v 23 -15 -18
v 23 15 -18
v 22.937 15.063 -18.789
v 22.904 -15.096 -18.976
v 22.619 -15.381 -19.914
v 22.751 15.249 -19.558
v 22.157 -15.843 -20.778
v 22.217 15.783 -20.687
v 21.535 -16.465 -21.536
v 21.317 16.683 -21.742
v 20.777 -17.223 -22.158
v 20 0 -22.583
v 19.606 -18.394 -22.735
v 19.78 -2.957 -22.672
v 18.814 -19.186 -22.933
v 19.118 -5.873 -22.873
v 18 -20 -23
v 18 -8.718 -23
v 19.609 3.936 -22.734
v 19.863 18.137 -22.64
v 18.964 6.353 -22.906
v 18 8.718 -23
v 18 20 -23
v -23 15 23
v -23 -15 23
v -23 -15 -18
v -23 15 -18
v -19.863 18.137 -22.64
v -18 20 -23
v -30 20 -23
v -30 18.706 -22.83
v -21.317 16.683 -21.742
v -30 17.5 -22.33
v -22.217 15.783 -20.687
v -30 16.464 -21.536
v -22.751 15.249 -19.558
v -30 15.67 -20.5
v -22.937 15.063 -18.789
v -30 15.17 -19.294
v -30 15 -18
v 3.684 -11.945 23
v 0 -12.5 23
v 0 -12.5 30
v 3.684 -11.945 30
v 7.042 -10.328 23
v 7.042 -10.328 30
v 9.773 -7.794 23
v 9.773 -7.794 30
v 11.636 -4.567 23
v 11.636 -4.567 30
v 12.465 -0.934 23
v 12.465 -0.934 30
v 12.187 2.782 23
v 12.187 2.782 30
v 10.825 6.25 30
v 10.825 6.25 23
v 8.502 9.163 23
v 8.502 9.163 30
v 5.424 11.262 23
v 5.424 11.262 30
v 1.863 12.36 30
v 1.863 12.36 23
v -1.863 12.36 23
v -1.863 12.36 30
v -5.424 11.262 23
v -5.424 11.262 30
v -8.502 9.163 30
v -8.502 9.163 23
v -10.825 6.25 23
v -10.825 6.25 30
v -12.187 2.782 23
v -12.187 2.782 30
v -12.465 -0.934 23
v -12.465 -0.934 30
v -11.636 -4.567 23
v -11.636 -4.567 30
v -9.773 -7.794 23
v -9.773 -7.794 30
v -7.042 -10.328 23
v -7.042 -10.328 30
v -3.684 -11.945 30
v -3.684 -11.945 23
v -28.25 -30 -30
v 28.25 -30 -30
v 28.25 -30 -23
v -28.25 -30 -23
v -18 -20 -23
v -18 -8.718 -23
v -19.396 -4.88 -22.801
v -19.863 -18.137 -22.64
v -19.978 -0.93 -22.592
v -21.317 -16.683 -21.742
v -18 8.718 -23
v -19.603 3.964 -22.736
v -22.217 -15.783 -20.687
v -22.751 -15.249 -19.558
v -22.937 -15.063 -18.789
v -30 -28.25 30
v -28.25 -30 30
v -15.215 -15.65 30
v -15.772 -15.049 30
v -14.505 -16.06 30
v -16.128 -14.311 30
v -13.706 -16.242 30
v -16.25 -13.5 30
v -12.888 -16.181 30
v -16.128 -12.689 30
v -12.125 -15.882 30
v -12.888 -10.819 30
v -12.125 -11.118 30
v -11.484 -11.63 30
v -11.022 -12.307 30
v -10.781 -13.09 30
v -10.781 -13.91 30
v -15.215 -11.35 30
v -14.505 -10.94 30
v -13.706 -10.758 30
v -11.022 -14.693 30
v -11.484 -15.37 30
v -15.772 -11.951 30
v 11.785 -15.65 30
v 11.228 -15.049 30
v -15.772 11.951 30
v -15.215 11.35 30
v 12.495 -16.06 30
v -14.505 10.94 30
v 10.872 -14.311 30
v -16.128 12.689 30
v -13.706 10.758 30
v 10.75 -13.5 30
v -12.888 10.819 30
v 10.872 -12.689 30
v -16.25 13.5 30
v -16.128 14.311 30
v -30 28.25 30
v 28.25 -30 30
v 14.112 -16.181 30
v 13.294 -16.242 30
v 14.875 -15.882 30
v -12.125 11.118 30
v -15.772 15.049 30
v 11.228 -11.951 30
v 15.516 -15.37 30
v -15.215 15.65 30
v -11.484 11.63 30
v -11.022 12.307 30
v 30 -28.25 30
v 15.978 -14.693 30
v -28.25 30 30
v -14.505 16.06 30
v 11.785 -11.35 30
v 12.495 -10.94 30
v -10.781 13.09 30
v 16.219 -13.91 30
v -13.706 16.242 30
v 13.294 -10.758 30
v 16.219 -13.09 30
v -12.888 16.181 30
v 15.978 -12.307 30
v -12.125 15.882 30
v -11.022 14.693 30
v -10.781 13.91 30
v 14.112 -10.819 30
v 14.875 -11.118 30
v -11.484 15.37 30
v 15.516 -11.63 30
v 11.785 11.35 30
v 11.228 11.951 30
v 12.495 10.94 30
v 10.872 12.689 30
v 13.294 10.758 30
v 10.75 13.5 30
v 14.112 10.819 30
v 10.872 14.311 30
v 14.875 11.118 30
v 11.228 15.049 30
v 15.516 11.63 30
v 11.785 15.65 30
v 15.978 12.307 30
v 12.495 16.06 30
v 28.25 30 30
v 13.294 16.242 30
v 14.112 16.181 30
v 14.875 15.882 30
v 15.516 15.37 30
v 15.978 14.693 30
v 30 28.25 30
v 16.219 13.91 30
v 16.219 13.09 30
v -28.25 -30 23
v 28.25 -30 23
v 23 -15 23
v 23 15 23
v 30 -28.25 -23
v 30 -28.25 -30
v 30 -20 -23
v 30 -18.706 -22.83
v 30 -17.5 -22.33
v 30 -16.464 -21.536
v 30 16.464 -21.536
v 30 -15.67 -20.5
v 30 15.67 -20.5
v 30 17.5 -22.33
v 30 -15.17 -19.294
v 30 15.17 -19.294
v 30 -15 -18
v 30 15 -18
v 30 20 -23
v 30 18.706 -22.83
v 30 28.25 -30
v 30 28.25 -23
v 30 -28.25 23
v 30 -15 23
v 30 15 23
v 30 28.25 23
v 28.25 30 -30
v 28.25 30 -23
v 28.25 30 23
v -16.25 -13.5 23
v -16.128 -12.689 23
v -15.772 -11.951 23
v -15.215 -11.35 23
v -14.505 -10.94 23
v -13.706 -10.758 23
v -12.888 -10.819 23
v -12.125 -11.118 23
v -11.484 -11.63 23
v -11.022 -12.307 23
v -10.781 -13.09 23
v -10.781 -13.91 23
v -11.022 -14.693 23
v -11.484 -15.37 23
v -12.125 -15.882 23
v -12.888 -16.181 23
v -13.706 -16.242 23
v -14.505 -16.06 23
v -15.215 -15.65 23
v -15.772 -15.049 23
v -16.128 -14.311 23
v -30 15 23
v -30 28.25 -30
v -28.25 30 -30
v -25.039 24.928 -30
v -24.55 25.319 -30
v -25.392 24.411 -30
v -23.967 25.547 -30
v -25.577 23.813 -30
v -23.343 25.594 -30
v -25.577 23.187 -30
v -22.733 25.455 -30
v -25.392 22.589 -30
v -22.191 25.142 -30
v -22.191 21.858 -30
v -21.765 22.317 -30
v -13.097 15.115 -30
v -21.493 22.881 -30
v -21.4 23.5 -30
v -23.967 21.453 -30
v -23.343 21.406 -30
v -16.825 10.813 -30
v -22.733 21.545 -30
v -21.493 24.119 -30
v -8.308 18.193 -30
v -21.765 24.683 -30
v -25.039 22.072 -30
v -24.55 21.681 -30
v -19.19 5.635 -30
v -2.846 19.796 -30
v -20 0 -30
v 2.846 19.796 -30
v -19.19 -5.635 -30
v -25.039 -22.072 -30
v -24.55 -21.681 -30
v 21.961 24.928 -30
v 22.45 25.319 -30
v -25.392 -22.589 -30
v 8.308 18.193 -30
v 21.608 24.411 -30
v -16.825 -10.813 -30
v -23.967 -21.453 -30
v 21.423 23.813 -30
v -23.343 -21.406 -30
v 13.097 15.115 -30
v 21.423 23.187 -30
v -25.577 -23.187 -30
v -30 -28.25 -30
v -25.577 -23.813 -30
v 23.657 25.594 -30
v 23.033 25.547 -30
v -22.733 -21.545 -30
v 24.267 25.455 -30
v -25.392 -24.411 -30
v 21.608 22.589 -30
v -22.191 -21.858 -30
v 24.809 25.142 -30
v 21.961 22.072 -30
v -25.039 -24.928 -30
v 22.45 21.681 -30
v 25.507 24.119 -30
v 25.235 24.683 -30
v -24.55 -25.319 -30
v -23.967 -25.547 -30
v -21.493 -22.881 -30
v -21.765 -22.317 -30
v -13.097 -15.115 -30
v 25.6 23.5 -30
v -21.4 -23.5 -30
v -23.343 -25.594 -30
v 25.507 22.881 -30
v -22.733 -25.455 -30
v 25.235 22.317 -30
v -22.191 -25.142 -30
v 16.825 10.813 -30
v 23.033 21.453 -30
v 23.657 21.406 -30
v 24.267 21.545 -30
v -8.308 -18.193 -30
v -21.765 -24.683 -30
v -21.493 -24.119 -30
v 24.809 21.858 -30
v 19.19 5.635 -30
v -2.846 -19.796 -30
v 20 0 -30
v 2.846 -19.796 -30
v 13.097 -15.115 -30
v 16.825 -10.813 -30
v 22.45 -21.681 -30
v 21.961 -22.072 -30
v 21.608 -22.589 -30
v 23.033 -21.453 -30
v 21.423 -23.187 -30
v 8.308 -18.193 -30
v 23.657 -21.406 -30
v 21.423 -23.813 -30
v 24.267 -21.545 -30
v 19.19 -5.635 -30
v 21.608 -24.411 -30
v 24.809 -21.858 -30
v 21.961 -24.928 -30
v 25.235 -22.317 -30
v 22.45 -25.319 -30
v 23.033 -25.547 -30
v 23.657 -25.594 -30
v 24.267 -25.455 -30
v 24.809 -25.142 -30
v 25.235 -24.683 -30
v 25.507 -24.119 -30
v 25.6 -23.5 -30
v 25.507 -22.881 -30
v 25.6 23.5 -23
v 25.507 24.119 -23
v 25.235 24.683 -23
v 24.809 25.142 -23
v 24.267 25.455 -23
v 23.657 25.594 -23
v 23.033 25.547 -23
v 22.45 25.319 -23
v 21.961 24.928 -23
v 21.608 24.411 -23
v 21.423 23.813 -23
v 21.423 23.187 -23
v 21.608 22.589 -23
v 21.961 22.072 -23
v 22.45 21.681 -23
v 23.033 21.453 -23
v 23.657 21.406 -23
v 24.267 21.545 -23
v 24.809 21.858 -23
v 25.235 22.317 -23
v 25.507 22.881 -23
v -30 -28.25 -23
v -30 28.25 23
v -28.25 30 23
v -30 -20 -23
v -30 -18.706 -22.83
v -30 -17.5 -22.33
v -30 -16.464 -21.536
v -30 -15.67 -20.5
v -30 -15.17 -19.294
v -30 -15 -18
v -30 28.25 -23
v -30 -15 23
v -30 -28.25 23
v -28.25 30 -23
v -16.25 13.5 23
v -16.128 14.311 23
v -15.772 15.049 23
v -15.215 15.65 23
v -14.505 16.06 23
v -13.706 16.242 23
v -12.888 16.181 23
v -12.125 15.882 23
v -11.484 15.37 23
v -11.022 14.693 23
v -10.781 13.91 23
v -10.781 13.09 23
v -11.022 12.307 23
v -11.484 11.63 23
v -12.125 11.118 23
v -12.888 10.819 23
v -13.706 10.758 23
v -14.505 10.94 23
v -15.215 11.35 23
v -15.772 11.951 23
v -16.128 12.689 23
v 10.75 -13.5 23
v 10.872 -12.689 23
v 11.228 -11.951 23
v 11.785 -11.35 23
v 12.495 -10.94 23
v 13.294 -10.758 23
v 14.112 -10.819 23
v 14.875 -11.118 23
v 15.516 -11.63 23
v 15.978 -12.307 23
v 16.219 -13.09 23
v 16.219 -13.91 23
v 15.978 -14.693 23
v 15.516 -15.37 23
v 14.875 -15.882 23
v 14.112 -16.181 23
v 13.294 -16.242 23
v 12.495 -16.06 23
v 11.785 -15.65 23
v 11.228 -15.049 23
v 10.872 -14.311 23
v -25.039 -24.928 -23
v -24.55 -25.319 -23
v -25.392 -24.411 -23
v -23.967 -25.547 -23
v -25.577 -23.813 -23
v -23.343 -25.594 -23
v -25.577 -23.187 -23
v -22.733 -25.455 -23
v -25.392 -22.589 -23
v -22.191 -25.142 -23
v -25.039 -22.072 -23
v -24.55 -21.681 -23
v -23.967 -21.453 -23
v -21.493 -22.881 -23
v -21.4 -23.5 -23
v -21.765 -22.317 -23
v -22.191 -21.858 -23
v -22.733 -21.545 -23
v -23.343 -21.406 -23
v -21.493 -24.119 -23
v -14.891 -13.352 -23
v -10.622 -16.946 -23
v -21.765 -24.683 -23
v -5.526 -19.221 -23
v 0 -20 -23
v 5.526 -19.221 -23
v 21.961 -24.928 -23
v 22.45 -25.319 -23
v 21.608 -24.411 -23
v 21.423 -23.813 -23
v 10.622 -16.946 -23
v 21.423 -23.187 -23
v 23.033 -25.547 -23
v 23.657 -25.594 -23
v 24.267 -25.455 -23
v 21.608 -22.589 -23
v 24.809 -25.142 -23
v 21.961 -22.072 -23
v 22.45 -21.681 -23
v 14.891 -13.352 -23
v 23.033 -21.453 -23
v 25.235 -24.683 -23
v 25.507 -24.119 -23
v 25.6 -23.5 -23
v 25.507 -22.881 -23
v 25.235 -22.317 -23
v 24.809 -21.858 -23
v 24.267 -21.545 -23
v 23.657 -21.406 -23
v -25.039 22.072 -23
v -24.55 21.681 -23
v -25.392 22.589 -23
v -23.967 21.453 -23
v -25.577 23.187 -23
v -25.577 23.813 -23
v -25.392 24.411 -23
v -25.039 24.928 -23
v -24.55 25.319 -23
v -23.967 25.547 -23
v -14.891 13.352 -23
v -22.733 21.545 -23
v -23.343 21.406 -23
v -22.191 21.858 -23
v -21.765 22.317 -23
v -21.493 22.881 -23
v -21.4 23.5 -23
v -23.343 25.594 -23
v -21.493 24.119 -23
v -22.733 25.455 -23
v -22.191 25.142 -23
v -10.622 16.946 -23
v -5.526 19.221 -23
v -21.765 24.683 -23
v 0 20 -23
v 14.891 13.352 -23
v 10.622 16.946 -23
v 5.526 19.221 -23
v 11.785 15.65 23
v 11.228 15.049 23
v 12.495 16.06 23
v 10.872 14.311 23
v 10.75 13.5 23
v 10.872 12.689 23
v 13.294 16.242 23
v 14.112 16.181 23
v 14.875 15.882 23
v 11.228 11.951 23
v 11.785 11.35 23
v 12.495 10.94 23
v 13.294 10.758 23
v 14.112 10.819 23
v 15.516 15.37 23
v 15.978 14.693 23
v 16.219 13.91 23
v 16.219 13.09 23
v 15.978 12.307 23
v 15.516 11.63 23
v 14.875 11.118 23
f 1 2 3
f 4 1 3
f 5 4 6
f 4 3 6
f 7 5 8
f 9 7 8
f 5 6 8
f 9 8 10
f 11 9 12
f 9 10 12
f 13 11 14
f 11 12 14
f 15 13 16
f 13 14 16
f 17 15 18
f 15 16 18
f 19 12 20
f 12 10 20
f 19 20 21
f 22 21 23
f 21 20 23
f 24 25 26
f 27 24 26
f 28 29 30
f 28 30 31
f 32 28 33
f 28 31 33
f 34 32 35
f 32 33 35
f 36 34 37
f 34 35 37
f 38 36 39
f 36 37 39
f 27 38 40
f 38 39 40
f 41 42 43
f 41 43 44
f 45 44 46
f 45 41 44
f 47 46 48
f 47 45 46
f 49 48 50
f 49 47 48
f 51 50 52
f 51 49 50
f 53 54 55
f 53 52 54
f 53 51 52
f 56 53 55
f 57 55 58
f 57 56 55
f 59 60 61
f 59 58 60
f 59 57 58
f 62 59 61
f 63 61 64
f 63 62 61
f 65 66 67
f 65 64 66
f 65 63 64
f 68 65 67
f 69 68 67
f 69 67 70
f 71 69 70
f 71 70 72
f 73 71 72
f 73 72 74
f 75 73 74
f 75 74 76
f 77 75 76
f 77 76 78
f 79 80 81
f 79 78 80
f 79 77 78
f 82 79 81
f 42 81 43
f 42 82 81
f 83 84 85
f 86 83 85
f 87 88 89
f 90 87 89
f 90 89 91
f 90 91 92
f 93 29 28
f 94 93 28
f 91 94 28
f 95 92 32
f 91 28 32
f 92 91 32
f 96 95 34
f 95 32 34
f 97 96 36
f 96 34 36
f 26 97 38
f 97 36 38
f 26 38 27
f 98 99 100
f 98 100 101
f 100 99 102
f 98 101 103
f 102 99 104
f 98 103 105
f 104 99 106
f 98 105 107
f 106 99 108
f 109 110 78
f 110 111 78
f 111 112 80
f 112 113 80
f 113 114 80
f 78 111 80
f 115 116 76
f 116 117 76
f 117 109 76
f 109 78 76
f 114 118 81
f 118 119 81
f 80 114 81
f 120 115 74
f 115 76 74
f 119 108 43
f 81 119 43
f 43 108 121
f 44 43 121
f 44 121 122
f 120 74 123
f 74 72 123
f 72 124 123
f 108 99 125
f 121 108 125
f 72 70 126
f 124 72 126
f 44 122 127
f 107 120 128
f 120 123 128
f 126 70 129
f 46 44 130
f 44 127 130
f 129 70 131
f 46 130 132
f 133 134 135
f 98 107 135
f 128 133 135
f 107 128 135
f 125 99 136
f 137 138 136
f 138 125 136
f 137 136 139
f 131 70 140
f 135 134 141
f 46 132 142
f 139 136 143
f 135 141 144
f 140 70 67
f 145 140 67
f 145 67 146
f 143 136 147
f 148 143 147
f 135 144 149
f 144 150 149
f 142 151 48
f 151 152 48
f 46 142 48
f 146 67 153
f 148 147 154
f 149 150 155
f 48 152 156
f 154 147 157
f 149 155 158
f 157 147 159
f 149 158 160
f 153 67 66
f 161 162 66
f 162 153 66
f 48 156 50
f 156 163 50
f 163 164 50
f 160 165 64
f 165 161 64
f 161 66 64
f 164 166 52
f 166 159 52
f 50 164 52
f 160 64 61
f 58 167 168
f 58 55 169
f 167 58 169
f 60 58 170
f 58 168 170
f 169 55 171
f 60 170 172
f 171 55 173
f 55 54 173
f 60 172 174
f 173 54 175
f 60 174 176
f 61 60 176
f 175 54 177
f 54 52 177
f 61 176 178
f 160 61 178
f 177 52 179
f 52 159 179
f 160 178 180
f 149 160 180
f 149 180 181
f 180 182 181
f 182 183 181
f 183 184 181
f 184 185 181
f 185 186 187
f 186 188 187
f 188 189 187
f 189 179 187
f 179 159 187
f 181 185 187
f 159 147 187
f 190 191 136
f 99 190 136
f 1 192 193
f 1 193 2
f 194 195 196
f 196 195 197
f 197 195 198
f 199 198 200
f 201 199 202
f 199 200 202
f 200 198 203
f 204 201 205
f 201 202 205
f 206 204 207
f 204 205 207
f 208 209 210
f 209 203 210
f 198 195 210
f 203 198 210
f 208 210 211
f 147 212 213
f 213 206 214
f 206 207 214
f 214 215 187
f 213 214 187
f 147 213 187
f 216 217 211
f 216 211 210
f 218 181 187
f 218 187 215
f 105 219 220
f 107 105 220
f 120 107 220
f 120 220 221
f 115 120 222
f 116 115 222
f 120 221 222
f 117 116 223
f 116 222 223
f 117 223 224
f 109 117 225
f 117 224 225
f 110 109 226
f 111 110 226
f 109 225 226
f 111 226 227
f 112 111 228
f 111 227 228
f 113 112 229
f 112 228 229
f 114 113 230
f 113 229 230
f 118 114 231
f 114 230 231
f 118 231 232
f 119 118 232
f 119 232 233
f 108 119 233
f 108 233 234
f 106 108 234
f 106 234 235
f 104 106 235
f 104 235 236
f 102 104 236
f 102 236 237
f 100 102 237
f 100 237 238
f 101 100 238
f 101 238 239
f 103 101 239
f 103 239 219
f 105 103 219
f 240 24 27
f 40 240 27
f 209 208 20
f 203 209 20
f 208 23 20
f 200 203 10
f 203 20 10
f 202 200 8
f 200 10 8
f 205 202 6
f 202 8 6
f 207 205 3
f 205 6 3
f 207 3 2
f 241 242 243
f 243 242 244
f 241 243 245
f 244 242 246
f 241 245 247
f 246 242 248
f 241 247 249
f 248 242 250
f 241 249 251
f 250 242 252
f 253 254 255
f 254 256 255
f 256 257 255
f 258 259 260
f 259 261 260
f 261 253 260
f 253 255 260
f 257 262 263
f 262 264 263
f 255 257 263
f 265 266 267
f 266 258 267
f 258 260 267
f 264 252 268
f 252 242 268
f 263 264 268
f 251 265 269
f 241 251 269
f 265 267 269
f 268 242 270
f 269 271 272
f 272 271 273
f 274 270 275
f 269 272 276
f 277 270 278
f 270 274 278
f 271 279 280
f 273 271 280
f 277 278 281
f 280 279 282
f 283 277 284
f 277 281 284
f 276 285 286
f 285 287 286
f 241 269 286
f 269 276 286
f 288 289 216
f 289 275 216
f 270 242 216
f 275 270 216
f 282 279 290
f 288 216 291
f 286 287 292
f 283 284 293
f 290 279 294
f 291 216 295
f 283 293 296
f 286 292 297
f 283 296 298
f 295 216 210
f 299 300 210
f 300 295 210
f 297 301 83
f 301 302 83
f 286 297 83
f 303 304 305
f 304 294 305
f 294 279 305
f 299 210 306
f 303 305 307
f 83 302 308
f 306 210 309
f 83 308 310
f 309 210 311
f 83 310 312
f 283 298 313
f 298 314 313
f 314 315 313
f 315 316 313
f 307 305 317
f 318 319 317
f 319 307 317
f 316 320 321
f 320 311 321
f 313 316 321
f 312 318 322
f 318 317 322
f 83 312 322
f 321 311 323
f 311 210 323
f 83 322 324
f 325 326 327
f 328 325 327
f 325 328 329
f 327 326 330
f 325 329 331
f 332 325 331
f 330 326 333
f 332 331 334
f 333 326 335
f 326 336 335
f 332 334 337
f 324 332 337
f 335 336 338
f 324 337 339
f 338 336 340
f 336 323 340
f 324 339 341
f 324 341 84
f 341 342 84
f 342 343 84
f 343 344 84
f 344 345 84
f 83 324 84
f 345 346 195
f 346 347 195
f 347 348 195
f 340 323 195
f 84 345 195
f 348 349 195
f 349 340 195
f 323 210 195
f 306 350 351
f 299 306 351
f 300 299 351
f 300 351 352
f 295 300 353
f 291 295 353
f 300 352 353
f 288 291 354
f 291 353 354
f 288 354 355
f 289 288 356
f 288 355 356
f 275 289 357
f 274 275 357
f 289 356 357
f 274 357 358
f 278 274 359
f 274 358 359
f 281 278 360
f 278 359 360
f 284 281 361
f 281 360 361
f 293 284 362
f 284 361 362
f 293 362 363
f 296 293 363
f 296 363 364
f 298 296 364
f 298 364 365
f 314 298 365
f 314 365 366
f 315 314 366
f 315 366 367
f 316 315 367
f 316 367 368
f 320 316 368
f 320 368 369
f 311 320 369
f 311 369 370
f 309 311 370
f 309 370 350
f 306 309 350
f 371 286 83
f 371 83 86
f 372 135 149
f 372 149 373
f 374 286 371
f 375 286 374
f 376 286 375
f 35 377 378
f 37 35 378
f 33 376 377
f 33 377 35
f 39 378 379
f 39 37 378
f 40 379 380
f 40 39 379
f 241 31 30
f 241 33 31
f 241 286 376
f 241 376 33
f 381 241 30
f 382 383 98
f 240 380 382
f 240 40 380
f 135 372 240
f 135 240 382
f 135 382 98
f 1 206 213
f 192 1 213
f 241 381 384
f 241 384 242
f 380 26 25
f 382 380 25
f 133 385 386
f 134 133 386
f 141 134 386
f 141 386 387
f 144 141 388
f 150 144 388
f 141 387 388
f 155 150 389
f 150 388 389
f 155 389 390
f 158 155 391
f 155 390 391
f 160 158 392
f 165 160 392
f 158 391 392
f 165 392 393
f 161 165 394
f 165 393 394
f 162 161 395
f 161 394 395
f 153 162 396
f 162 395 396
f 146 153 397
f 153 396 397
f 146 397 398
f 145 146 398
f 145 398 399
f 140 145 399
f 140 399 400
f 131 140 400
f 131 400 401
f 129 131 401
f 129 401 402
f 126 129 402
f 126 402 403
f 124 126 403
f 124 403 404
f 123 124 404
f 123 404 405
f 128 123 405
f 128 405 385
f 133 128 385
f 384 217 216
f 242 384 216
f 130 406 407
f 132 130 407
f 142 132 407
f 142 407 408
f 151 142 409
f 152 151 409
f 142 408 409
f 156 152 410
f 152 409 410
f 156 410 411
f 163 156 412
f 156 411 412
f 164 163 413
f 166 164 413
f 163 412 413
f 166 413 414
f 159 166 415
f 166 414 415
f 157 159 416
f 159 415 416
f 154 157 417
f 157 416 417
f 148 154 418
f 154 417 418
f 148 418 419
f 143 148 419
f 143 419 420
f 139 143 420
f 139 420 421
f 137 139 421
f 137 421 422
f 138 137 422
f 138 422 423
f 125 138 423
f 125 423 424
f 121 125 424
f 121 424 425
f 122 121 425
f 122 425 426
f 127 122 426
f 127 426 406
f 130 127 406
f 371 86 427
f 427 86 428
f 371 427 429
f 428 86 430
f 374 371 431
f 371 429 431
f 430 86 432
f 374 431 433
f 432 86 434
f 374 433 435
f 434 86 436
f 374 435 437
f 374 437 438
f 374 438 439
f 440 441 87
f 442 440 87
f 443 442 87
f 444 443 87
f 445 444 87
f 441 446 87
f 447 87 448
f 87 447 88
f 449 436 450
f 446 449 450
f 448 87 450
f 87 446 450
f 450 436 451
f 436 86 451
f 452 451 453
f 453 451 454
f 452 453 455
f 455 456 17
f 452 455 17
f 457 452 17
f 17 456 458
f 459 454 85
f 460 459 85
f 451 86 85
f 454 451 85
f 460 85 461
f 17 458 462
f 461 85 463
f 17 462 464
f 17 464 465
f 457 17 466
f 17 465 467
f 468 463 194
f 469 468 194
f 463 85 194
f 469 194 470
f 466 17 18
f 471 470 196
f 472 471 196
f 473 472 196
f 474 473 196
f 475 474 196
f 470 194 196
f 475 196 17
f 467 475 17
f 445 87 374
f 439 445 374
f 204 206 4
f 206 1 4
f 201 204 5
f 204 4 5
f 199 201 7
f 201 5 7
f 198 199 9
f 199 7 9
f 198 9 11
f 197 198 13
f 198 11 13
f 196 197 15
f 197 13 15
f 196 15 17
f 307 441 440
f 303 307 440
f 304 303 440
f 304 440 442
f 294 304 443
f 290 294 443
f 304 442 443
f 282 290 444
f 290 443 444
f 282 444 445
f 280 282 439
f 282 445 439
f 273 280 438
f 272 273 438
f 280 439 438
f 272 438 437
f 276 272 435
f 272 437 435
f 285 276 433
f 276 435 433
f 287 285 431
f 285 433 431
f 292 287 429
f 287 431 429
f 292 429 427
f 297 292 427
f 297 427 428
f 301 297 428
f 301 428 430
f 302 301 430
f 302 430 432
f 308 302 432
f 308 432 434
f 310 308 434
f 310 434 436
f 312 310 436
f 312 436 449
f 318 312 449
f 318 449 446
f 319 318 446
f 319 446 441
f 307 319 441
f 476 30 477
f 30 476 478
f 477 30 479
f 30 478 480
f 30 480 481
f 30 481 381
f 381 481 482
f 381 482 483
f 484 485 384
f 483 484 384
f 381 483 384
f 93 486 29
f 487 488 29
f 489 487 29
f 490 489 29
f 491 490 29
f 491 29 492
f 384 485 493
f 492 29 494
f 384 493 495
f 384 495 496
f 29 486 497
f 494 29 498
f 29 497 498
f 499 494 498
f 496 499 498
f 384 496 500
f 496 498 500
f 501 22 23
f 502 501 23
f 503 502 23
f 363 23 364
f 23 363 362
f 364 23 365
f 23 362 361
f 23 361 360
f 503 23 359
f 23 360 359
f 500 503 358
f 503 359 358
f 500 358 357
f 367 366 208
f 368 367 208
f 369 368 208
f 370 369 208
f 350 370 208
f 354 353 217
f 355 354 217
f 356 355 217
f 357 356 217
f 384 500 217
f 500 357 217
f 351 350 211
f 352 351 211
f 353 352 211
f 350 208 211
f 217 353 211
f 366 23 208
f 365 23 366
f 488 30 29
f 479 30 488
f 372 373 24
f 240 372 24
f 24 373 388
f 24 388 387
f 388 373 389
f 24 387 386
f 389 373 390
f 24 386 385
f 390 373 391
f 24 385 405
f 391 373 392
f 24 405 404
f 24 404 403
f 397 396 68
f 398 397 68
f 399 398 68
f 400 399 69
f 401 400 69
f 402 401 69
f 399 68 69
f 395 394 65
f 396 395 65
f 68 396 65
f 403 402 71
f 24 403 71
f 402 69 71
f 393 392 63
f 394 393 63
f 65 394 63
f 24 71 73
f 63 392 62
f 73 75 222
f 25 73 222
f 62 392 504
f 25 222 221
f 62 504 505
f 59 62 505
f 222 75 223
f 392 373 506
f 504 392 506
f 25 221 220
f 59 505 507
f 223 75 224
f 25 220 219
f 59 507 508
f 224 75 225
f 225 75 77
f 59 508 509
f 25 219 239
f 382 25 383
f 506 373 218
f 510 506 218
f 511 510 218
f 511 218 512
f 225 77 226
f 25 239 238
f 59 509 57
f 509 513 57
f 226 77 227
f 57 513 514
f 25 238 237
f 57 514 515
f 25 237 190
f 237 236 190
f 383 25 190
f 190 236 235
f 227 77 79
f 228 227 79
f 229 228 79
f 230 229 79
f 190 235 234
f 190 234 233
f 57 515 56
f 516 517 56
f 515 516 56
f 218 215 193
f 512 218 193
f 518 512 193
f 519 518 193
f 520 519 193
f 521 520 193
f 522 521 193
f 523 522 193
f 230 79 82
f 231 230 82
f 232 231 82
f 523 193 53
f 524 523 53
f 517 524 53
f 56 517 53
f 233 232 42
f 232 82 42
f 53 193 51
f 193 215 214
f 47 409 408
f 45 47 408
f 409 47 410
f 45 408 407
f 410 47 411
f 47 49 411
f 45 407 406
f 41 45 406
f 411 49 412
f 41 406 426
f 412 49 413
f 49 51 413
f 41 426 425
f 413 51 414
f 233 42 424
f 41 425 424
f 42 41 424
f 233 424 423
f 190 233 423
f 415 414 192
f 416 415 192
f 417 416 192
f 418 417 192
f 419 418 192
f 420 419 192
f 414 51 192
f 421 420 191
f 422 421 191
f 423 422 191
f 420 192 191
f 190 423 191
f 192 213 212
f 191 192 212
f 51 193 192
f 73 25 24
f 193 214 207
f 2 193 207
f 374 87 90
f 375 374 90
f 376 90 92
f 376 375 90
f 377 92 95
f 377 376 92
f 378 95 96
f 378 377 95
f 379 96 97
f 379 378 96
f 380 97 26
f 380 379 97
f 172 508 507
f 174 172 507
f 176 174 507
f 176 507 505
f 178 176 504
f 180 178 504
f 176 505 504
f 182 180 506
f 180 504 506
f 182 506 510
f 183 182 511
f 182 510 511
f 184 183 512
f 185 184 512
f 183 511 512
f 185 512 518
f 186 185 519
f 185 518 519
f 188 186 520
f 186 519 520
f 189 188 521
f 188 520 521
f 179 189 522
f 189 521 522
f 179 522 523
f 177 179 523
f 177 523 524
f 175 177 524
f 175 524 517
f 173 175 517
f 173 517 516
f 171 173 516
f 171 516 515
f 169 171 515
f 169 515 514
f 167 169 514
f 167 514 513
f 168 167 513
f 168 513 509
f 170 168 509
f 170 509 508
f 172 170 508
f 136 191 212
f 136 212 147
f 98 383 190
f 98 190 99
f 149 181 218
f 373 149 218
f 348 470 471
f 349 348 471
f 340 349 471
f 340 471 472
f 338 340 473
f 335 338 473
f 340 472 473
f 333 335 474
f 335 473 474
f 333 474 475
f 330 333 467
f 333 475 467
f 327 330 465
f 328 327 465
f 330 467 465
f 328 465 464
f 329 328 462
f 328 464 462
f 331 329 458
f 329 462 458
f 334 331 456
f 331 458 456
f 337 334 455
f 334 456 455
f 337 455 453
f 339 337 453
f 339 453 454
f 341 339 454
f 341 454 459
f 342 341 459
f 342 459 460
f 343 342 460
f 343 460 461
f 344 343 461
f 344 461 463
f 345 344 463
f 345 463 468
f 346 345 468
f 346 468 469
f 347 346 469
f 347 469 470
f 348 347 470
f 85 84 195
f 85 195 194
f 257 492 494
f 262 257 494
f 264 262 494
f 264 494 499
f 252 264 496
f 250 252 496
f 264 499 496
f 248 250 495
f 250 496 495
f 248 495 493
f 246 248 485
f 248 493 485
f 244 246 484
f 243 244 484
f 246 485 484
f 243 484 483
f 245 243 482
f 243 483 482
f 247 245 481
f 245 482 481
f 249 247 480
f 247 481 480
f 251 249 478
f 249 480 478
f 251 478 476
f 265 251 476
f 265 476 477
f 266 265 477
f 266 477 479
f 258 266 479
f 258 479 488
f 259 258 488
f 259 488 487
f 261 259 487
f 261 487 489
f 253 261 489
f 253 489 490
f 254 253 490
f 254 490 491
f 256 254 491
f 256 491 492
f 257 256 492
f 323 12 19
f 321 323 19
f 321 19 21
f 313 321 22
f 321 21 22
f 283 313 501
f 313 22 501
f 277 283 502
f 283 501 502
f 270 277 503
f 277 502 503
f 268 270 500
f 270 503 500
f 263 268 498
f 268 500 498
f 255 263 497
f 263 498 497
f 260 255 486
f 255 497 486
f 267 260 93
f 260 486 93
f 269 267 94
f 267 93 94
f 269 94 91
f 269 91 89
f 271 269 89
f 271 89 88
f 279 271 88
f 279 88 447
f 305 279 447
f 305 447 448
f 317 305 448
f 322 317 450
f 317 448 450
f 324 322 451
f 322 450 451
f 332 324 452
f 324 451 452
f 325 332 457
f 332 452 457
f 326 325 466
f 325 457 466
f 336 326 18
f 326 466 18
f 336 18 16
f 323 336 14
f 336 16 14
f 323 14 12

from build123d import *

# Parameters (mm, degrees)
BOSS_EXTRUDE1_DEPTH       = 30
CUT_EXTRUDE1_DEPTH        = 52.961524227
CUT_EXTRUDE1_DEPTH_BACK   = 52.961524227
SKETCH2_W                 = 46
SKETCH2_H                 = 46
FILLET1_R                 = 5
CHAMFER1_SIZE             = 1.75
M5X0_8_TAPPED_HOLE1_D     = 4.2
M5X0_8_TAPPED_HOLE1_DEPTH = 7
M5_CLEARANCE_HOLE1_D      = 5.5
M5_CLEARANCE_HOLE1_DEPTH  = 7
SKETCH11_R                = 12.5
CUT_EXTRUDE2_DEPTH        = 52.961524227
SKETCH12_R                = 20
CUT_EXTRUDE3_DEPTH        = 52.961524227


with BuildPart() as part:
    # Sketch1 → Boss-Extrude1 (new, symmetric)
    with BuildSketch(Plane(origin=(0, 0, 0), x_dir=(0, 0, -1), z_dir=(1, 0, 0))):
        Polygon((-30, -30), (-30, 30), (-23, 30), (-23, 15), (23, 15), (23, 30), (30, 30), (30, -30), (23, -30), (23, -15), (-23, -15), (-23, -30), align=None)
    extrude(amount=BOSS_EXTRUDE1_DEPTH, both=True)

    # Sketch2 → Cut-Extrude1 (cut, two sides: drawn at the far end of the back side and taken through both)
    with BuildSketch(Plane(origin=(0, 0, 0), x_dir=(1, 0, 0), z_dir=(0, 1, 0)).offset(-CUT_EXTRUDE1_DEPTH_BACK)):
        Rectangle(SKETCH2_W, SKETCH2_H)
    extrude(amount=CUT_EXTRUDE1_DEPTH + CUT_EXTRUDE1_DEPTH_BACK, mode=Mode.SUBTRACT)

    # Fillet1
    fillet1_edges = [part.edges().sort_by_distance(p)[0] for p in [
        (26.5, 15, -23),
        (26.5, -15, -23),
        (-26.5, 15, -23),
        (-26.5, -15, -23),
        (-23, 0, -23),
        (23, 0, -23),
    ]]
    fillet(fillet1_edges, radius=FILLET1_R)

    # Chamfer1
    chamfer1_edges = [part.edges().sort_by_distance(p)[0] for p in [
        (-30, 30, 26.5),
        (-30, 30, -26.5),
        (-30, -30, -26.5),
        (-30, -30, 26.5),
        (30, -30, -26.5),
        (30, 30, -26.5),
        (30, 30, 26.5),
        (30, -30, 26.5),
    ]]
    chamfer(chamfer1_edges, length=CHAMFER1_SIZE)

    # M5x0.8 Tapped Hole1
    with Locations(Plane(origin=(0, 0, -30), x_dir=(-1, 0, 0), z_dir=(0, 0, -1))):
        with Locations((-23.5, 23.5), (23.5, 23.5), (23.5, -23.5), (-23.5, -23.5)):
            Hole(M5X0_8_TAPPED_HOLE1_D / 2, depth=M5X0_8_TAPPED_HOLE1_DEPTH)

    # M5 Clearance Hole1
    with Locations(Plane.XY.offset(30)):
        with Locations((-13.5, 13.5), (-13.5, -13.5), (13.5, -13.5), (13.5, 13.5)):
            Hole(M5_CLEARANCE_HOLE1_D / 2, depth=M5_CLEARANCE_HOLE1_DEPTH)

    # Sketch11 → Cut-Extrude2 (cut, through all)
    with BuildSketch(Plane.XY):
        with Locations(Location((0, 0, 0), (0, 0, 270))):
            Circle(SKETCH11_R)
    extrude(amount=CUT_EXTRUDE2_DEPTH, mode=Mode.SUBTRACT)

    # Sketch12 → Cut-Extrude3 (cut, through all)
    with BuildSketch(Plane.XY):
        Circle(SKETCH12_R)
    extrude(amount=-CUT_EXTRUDE3_DEPTH, mode=Mode.SUBTRACT)


solid = part.part
